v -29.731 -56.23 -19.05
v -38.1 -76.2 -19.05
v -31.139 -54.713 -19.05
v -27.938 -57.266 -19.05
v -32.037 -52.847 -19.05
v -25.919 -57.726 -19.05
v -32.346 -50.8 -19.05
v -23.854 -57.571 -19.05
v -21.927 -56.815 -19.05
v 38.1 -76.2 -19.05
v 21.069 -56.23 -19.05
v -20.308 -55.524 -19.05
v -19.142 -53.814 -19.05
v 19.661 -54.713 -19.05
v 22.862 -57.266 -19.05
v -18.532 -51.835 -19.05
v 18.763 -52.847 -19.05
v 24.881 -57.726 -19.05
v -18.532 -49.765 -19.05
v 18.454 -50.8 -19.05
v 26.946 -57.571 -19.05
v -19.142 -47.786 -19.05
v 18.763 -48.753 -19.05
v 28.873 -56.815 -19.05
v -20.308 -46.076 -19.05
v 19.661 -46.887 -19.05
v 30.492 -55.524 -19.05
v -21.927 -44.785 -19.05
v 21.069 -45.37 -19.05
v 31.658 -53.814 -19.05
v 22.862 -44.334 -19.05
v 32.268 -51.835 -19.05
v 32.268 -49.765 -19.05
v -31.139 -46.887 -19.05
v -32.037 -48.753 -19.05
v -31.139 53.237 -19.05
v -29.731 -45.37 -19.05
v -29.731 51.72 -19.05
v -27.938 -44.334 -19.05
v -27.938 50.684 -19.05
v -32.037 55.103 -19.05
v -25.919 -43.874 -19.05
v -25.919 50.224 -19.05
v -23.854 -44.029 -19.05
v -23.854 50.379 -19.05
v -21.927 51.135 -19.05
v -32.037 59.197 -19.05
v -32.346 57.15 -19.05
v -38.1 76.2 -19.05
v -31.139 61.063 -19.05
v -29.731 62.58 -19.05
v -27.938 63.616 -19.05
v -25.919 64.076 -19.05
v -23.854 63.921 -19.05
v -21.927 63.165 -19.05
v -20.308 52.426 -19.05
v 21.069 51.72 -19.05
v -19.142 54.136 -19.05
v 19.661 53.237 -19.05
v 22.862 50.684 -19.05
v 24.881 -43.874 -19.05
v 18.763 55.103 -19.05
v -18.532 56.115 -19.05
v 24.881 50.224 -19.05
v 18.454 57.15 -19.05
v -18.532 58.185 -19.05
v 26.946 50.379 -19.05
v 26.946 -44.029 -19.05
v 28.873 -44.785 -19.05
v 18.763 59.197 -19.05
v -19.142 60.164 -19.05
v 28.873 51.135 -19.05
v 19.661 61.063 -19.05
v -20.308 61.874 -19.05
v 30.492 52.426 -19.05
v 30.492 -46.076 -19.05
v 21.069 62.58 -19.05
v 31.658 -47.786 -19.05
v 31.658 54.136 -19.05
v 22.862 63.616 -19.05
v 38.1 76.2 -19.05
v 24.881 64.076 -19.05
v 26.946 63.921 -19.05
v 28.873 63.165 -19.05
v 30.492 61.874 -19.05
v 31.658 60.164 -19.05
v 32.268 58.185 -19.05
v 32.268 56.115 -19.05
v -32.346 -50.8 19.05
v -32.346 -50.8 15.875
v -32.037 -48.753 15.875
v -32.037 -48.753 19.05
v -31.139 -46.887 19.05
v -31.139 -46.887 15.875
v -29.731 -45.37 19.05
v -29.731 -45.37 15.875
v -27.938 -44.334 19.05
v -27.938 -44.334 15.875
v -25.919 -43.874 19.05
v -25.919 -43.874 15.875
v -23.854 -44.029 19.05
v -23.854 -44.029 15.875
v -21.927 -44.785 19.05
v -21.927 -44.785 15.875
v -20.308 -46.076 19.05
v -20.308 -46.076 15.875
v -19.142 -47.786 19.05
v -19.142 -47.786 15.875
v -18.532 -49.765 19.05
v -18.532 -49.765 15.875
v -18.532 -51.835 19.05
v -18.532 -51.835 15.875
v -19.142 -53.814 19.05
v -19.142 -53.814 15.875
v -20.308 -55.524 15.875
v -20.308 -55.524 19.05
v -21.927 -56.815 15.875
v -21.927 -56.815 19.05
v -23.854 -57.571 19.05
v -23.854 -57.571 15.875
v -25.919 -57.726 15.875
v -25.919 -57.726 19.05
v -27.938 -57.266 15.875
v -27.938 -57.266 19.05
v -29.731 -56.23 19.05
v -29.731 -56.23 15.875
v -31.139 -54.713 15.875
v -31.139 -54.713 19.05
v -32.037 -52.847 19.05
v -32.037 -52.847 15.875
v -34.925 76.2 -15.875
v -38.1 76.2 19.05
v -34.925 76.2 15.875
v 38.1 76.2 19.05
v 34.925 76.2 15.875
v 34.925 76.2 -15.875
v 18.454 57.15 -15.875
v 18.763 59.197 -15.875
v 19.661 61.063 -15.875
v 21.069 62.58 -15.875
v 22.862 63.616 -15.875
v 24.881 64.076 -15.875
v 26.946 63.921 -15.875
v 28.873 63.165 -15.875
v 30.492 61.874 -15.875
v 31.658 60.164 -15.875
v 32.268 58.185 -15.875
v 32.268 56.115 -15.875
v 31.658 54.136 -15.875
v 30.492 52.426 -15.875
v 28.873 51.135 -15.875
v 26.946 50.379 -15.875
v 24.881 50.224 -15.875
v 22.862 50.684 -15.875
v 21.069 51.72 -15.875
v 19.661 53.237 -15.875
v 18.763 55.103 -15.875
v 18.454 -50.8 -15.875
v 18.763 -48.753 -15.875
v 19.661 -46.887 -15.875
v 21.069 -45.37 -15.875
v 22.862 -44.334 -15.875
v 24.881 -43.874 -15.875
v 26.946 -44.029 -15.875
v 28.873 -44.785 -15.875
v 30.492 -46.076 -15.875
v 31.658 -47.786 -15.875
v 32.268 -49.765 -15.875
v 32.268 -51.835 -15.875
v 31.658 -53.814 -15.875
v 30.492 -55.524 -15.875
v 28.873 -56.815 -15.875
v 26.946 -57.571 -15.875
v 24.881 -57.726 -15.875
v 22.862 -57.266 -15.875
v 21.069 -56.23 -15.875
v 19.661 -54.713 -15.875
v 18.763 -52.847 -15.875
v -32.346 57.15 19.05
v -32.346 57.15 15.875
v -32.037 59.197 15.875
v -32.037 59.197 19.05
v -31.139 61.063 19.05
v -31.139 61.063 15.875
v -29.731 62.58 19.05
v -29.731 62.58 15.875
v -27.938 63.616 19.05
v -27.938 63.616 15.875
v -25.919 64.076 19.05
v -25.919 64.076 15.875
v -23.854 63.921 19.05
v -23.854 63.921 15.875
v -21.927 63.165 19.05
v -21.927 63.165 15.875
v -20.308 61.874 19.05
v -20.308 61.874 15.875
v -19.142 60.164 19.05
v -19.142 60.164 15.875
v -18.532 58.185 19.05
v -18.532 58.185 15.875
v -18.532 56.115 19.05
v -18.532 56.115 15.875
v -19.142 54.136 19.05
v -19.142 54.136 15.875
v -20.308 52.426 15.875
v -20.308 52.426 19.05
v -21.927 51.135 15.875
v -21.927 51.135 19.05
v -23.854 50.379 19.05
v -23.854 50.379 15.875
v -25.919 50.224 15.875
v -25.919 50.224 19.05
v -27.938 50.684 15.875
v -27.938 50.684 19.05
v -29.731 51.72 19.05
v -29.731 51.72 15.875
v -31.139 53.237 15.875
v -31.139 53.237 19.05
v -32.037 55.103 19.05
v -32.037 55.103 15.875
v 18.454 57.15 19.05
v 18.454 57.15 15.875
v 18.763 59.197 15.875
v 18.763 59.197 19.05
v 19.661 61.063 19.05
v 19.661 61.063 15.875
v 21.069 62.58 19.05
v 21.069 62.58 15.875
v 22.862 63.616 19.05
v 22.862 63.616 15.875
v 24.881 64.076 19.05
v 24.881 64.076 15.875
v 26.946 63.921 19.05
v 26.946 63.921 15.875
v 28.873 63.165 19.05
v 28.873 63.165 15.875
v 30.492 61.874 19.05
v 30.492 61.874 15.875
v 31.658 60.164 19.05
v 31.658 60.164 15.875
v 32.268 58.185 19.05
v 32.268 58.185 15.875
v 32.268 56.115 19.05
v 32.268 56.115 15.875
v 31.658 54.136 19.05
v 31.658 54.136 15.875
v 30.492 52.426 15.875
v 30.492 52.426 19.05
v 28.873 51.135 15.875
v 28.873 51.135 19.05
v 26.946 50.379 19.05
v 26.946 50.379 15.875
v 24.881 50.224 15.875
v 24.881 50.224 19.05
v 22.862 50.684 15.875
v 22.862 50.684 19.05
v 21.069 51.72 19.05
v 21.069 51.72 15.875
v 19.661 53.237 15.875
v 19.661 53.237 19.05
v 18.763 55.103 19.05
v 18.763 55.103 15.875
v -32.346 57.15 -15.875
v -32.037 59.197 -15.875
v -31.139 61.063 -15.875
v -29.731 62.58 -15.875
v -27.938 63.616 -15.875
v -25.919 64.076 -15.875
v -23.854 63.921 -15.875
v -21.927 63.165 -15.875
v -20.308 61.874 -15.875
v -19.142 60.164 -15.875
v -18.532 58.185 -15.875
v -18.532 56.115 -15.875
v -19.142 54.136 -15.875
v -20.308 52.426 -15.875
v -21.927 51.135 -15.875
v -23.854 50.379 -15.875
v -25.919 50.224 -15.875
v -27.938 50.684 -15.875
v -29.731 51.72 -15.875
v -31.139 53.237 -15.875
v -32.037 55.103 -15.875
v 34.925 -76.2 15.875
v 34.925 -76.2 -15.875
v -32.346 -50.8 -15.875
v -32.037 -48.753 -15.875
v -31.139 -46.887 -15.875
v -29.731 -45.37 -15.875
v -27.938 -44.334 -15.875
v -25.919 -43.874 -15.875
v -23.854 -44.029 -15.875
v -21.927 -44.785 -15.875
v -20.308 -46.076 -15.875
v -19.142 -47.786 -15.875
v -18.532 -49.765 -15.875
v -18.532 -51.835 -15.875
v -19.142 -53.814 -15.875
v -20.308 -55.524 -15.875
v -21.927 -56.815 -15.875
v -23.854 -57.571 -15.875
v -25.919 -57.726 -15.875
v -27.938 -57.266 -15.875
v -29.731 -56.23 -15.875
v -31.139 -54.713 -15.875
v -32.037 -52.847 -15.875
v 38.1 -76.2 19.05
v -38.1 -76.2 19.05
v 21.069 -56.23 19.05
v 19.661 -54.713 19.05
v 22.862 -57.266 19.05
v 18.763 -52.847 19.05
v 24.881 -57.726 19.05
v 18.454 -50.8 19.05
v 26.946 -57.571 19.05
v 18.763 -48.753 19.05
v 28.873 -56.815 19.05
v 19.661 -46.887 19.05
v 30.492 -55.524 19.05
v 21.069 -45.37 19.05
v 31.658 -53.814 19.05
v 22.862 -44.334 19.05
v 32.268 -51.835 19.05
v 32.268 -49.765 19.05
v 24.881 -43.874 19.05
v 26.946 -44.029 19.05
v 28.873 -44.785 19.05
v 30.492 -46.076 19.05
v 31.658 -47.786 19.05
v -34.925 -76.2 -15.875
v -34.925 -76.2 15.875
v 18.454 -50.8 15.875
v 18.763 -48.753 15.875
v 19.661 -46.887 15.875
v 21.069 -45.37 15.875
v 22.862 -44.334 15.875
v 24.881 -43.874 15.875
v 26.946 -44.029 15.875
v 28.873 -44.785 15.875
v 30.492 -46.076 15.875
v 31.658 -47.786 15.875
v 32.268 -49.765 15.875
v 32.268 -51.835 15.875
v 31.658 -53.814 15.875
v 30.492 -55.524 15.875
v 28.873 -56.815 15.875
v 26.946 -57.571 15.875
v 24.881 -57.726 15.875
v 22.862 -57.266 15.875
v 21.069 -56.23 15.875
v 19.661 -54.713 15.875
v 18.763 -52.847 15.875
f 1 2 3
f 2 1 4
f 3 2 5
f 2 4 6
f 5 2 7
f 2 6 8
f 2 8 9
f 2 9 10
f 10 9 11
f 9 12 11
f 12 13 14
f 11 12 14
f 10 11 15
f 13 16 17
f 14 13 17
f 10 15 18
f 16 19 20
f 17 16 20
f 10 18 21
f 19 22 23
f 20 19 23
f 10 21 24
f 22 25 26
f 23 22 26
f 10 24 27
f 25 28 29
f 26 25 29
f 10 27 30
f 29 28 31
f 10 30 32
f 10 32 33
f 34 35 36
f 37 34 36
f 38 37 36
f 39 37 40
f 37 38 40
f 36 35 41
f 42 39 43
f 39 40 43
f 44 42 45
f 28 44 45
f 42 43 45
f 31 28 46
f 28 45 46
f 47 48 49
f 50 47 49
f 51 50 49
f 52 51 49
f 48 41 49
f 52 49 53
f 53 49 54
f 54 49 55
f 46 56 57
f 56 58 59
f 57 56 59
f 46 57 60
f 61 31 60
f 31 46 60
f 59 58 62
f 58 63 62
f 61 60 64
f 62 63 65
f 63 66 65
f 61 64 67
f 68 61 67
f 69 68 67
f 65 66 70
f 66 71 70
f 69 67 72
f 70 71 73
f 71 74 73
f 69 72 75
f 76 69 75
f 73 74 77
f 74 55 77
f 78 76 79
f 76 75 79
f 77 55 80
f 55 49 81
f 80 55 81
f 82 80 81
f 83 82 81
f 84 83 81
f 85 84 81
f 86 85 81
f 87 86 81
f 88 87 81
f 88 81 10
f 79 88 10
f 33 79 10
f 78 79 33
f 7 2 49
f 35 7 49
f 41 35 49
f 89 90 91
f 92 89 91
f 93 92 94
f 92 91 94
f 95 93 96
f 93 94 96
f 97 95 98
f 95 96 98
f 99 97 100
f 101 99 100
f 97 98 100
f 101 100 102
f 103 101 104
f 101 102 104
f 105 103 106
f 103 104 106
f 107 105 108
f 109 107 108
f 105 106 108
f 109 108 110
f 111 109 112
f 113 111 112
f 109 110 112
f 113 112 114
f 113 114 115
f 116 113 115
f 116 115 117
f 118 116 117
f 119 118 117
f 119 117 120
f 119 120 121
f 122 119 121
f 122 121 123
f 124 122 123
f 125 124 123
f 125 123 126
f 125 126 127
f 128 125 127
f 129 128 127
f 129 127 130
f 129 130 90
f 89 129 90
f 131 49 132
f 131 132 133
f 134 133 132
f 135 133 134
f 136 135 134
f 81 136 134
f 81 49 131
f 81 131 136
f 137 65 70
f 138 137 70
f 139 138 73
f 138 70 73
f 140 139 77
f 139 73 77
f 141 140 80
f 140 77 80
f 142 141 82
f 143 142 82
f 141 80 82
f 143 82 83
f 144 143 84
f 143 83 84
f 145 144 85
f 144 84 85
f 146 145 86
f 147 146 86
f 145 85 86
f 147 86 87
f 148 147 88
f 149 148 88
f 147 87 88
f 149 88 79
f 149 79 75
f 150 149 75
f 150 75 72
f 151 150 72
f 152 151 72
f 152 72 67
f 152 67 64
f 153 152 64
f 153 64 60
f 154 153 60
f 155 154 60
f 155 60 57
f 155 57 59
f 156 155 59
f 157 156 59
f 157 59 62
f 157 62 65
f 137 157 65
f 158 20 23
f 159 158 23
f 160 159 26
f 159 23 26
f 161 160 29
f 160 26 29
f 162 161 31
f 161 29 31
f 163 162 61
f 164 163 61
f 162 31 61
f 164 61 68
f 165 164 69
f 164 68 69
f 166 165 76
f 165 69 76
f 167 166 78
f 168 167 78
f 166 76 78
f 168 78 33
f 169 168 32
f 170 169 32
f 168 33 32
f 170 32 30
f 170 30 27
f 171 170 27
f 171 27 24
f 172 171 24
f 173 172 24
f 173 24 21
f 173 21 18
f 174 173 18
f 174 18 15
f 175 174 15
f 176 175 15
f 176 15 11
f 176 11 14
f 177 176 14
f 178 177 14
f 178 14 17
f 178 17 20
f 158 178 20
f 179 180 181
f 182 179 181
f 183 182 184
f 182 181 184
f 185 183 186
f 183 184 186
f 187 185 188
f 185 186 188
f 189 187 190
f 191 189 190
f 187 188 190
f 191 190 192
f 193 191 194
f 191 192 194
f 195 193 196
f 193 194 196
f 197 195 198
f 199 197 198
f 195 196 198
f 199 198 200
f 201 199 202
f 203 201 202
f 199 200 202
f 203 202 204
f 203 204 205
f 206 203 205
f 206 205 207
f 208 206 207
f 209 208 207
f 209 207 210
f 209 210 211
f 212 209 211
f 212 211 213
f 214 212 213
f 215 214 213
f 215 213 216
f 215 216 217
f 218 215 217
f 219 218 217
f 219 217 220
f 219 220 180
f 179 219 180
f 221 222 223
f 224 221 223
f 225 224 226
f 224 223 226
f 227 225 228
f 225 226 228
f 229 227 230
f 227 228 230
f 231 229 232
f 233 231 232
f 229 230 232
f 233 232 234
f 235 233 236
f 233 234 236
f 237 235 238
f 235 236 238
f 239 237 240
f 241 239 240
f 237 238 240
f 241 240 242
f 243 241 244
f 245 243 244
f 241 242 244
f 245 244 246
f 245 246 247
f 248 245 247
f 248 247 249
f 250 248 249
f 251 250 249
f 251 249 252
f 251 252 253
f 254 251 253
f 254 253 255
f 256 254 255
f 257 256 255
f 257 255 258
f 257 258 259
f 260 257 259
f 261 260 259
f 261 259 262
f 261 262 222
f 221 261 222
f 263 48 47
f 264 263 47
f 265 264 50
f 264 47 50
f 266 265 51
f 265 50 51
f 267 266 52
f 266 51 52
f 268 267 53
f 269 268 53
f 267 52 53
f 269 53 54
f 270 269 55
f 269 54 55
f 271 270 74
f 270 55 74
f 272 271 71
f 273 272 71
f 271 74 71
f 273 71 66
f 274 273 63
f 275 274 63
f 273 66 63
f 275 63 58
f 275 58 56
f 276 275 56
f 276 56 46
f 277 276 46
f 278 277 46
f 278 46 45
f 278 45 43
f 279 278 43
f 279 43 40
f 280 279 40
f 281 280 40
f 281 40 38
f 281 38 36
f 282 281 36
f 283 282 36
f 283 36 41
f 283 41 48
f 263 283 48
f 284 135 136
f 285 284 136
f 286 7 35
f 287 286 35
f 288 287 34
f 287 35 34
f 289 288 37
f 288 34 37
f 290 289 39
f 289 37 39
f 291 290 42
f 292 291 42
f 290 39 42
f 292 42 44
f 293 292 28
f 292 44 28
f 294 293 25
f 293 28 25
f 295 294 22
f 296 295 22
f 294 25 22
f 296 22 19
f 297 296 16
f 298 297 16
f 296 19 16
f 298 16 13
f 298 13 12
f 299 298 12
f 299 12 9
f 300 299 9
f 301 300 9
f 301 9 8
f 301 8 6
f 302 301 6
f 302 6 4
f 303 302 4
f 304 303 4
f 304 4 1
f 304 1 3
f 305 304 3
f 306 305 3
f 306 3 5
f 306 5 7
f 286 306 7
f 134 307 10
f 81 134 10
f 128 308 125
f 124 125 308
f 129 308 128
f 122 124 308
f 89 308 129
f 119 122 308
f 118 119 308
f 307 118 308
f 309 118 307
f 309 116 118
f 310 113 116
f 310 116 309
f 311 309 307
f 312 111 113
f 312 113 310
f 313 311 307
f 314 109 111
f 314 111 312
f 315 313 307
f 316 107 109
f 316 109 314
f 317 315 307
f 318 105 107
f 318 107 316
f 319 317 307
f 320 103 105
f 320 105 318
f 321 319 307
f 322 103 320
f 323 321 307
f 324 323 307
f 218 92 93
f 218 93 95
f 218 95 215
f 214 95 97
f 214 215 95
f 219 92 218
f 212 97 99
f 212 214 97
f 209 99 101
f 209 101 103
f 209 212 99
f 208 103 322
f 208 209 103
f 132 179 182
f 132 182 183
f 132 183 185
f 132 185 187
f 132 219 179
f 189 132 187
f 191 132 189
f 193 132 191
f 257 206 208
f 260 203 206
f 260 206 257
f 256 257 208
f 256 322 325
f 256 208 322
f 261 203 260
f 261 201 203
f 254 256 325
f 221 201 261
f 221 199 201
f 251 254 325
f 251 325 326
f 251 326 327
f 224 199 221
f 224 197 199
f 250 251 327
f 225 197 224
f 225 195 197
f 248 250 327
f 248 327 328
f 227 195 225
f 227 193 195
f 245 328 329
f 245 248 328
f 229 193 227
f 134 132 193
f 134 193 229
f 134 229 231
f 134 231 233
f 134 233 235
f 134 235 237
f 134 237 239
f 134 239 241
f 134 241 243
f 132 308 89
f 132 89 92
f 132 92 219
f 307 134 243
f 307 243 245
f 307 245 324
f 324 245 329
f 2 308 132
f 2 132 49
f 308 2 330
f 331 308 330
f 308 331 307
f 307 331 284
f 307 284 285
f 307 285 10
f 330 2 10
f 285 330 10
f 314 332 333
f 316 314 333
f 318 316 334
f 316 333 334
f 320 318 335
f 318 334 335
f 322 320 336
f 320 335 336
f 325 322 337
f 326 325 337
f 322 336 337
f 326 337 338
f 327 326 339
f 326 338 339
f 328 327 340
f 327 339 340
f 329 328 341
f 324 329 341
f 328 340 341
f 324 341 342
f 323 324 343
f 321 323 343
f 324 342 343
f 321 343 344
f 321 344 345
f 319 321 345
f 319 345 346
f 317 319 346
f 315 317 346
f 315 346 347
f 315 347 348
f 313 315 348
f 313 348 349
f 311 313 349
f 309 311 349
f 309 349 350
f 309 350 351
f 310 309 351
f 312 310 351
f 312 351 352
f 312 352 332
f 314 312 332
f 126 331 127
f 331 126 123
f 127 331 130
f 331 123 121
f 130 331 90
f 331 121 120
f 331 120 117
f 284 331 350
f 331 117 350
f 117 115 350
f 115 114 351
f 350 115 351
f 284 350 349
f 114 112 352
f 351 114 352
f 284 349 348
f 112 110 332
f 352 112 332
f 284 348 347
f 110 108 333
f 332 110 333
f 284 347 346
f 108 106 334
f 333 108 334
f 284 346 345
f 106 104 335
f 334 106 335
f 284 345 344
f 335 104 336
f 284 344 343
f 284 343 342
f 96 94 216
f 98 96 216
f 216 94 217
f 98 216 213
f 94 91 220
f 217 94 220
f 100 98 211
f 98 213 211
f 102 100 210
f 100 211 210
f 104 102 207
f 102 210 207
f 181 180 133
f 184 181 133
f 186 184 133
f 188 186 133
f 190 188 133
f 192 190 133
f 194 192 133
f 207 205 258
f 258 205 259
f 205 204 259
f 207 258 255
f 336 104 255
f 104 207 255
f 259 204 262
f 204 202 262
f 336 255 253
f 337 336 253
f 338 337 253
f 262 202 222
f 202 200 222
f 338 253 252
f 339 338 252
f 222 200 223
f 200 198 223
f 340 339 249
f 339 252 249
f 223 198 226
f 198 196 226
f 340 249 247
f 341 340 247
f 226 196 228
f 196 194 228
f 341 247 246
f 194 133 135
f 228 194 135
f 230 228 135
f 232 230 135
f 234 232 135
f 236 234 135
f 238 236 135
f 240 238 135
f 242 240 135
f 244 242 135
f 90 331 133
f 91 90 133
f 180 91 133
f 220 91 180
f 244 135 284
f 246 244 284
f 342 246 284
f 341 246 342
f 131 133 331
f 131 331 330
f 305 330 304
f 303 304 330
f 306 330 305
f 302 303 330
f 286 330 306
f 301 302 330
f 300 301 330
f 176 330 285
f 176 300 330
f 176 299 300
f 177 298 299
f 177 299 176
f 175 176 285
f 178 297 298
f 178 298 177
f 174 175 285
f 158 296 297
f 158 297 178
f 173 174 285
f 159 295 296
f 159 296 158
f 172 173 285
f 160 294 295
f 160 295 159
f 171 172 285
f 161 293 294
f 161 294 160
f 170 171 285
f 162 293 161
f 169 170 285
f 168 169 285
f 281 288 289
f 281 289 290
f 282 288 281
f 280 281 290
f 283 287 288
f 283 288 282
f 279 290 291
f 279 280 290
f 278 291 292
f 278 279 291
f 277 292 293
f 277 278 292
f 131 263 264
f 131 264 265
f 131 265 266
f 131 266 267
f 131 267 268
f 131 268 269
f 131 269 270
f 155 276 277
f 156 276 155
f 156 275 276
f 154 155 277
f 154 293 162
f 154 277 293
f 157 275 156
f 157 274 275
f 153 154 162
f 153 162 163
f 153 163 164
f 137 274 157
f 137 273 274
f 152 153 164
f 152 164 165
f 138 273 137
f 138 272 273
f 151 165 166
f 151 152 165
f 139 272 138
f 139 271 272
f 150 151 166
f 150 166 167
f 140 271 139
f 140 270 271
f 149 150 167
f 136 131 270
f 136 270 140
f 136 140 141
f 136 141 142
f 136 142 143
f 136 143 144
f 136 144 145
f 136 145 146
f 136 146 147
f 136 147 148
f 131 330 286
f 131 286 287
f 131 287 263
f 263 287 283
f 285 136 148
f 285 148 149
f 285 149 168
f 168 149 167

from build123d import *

# Parameters (mm, degrees)
SKETCH1_W               = 76.2
SKETCH1_H               = 38.1
EXTRUDE1_DEPTH          = 76.2
SKETCH2_W               = 69.85
SKETCH2_H               = 31.75
EXTRUDE2_DEPTH          = 159.241184589
F_1_2_CLEARANCE_HOLE1_D = 13.89126


with BuildPart() as part:
    # Sketch1 → Extrude1 (new, symmetric)
    with BuildSketch(Plane(origin=(0, 0, 0), x_dir=(1, 0, 0), z_dir=(0, 1, 0))):
        Rectangle(SKETCH1_W, SKETCH1_H)
    extrude(amount=EXTRUDE1_DEPTH, both=True)

    # Sketch2 → Extrude2 (cut, through all)
    with BuildSketch(Plane(origin=(0, 76.2, 0), x_dir=(1, 0, 0), z_dir=(0, 1, 0))):
        Rectangle(SKETCH2_W, SKETCH2_H)
    extrude(amount=-EXTRUDE2_DEPTH, mode=Mode.SUBTRACT)

    # 1/2 Clearance Hole1 (through all)
    with Locations(Plane.XY.offset(19.05)):
        with Locations((25.4, 57.15), (-25.4, 57.15), (-25.4, -50.8), (25.4, -50.8)):
            Hole(F_1_2_CLEARANCE_HOLE1_D / 2)


solid = part.part
